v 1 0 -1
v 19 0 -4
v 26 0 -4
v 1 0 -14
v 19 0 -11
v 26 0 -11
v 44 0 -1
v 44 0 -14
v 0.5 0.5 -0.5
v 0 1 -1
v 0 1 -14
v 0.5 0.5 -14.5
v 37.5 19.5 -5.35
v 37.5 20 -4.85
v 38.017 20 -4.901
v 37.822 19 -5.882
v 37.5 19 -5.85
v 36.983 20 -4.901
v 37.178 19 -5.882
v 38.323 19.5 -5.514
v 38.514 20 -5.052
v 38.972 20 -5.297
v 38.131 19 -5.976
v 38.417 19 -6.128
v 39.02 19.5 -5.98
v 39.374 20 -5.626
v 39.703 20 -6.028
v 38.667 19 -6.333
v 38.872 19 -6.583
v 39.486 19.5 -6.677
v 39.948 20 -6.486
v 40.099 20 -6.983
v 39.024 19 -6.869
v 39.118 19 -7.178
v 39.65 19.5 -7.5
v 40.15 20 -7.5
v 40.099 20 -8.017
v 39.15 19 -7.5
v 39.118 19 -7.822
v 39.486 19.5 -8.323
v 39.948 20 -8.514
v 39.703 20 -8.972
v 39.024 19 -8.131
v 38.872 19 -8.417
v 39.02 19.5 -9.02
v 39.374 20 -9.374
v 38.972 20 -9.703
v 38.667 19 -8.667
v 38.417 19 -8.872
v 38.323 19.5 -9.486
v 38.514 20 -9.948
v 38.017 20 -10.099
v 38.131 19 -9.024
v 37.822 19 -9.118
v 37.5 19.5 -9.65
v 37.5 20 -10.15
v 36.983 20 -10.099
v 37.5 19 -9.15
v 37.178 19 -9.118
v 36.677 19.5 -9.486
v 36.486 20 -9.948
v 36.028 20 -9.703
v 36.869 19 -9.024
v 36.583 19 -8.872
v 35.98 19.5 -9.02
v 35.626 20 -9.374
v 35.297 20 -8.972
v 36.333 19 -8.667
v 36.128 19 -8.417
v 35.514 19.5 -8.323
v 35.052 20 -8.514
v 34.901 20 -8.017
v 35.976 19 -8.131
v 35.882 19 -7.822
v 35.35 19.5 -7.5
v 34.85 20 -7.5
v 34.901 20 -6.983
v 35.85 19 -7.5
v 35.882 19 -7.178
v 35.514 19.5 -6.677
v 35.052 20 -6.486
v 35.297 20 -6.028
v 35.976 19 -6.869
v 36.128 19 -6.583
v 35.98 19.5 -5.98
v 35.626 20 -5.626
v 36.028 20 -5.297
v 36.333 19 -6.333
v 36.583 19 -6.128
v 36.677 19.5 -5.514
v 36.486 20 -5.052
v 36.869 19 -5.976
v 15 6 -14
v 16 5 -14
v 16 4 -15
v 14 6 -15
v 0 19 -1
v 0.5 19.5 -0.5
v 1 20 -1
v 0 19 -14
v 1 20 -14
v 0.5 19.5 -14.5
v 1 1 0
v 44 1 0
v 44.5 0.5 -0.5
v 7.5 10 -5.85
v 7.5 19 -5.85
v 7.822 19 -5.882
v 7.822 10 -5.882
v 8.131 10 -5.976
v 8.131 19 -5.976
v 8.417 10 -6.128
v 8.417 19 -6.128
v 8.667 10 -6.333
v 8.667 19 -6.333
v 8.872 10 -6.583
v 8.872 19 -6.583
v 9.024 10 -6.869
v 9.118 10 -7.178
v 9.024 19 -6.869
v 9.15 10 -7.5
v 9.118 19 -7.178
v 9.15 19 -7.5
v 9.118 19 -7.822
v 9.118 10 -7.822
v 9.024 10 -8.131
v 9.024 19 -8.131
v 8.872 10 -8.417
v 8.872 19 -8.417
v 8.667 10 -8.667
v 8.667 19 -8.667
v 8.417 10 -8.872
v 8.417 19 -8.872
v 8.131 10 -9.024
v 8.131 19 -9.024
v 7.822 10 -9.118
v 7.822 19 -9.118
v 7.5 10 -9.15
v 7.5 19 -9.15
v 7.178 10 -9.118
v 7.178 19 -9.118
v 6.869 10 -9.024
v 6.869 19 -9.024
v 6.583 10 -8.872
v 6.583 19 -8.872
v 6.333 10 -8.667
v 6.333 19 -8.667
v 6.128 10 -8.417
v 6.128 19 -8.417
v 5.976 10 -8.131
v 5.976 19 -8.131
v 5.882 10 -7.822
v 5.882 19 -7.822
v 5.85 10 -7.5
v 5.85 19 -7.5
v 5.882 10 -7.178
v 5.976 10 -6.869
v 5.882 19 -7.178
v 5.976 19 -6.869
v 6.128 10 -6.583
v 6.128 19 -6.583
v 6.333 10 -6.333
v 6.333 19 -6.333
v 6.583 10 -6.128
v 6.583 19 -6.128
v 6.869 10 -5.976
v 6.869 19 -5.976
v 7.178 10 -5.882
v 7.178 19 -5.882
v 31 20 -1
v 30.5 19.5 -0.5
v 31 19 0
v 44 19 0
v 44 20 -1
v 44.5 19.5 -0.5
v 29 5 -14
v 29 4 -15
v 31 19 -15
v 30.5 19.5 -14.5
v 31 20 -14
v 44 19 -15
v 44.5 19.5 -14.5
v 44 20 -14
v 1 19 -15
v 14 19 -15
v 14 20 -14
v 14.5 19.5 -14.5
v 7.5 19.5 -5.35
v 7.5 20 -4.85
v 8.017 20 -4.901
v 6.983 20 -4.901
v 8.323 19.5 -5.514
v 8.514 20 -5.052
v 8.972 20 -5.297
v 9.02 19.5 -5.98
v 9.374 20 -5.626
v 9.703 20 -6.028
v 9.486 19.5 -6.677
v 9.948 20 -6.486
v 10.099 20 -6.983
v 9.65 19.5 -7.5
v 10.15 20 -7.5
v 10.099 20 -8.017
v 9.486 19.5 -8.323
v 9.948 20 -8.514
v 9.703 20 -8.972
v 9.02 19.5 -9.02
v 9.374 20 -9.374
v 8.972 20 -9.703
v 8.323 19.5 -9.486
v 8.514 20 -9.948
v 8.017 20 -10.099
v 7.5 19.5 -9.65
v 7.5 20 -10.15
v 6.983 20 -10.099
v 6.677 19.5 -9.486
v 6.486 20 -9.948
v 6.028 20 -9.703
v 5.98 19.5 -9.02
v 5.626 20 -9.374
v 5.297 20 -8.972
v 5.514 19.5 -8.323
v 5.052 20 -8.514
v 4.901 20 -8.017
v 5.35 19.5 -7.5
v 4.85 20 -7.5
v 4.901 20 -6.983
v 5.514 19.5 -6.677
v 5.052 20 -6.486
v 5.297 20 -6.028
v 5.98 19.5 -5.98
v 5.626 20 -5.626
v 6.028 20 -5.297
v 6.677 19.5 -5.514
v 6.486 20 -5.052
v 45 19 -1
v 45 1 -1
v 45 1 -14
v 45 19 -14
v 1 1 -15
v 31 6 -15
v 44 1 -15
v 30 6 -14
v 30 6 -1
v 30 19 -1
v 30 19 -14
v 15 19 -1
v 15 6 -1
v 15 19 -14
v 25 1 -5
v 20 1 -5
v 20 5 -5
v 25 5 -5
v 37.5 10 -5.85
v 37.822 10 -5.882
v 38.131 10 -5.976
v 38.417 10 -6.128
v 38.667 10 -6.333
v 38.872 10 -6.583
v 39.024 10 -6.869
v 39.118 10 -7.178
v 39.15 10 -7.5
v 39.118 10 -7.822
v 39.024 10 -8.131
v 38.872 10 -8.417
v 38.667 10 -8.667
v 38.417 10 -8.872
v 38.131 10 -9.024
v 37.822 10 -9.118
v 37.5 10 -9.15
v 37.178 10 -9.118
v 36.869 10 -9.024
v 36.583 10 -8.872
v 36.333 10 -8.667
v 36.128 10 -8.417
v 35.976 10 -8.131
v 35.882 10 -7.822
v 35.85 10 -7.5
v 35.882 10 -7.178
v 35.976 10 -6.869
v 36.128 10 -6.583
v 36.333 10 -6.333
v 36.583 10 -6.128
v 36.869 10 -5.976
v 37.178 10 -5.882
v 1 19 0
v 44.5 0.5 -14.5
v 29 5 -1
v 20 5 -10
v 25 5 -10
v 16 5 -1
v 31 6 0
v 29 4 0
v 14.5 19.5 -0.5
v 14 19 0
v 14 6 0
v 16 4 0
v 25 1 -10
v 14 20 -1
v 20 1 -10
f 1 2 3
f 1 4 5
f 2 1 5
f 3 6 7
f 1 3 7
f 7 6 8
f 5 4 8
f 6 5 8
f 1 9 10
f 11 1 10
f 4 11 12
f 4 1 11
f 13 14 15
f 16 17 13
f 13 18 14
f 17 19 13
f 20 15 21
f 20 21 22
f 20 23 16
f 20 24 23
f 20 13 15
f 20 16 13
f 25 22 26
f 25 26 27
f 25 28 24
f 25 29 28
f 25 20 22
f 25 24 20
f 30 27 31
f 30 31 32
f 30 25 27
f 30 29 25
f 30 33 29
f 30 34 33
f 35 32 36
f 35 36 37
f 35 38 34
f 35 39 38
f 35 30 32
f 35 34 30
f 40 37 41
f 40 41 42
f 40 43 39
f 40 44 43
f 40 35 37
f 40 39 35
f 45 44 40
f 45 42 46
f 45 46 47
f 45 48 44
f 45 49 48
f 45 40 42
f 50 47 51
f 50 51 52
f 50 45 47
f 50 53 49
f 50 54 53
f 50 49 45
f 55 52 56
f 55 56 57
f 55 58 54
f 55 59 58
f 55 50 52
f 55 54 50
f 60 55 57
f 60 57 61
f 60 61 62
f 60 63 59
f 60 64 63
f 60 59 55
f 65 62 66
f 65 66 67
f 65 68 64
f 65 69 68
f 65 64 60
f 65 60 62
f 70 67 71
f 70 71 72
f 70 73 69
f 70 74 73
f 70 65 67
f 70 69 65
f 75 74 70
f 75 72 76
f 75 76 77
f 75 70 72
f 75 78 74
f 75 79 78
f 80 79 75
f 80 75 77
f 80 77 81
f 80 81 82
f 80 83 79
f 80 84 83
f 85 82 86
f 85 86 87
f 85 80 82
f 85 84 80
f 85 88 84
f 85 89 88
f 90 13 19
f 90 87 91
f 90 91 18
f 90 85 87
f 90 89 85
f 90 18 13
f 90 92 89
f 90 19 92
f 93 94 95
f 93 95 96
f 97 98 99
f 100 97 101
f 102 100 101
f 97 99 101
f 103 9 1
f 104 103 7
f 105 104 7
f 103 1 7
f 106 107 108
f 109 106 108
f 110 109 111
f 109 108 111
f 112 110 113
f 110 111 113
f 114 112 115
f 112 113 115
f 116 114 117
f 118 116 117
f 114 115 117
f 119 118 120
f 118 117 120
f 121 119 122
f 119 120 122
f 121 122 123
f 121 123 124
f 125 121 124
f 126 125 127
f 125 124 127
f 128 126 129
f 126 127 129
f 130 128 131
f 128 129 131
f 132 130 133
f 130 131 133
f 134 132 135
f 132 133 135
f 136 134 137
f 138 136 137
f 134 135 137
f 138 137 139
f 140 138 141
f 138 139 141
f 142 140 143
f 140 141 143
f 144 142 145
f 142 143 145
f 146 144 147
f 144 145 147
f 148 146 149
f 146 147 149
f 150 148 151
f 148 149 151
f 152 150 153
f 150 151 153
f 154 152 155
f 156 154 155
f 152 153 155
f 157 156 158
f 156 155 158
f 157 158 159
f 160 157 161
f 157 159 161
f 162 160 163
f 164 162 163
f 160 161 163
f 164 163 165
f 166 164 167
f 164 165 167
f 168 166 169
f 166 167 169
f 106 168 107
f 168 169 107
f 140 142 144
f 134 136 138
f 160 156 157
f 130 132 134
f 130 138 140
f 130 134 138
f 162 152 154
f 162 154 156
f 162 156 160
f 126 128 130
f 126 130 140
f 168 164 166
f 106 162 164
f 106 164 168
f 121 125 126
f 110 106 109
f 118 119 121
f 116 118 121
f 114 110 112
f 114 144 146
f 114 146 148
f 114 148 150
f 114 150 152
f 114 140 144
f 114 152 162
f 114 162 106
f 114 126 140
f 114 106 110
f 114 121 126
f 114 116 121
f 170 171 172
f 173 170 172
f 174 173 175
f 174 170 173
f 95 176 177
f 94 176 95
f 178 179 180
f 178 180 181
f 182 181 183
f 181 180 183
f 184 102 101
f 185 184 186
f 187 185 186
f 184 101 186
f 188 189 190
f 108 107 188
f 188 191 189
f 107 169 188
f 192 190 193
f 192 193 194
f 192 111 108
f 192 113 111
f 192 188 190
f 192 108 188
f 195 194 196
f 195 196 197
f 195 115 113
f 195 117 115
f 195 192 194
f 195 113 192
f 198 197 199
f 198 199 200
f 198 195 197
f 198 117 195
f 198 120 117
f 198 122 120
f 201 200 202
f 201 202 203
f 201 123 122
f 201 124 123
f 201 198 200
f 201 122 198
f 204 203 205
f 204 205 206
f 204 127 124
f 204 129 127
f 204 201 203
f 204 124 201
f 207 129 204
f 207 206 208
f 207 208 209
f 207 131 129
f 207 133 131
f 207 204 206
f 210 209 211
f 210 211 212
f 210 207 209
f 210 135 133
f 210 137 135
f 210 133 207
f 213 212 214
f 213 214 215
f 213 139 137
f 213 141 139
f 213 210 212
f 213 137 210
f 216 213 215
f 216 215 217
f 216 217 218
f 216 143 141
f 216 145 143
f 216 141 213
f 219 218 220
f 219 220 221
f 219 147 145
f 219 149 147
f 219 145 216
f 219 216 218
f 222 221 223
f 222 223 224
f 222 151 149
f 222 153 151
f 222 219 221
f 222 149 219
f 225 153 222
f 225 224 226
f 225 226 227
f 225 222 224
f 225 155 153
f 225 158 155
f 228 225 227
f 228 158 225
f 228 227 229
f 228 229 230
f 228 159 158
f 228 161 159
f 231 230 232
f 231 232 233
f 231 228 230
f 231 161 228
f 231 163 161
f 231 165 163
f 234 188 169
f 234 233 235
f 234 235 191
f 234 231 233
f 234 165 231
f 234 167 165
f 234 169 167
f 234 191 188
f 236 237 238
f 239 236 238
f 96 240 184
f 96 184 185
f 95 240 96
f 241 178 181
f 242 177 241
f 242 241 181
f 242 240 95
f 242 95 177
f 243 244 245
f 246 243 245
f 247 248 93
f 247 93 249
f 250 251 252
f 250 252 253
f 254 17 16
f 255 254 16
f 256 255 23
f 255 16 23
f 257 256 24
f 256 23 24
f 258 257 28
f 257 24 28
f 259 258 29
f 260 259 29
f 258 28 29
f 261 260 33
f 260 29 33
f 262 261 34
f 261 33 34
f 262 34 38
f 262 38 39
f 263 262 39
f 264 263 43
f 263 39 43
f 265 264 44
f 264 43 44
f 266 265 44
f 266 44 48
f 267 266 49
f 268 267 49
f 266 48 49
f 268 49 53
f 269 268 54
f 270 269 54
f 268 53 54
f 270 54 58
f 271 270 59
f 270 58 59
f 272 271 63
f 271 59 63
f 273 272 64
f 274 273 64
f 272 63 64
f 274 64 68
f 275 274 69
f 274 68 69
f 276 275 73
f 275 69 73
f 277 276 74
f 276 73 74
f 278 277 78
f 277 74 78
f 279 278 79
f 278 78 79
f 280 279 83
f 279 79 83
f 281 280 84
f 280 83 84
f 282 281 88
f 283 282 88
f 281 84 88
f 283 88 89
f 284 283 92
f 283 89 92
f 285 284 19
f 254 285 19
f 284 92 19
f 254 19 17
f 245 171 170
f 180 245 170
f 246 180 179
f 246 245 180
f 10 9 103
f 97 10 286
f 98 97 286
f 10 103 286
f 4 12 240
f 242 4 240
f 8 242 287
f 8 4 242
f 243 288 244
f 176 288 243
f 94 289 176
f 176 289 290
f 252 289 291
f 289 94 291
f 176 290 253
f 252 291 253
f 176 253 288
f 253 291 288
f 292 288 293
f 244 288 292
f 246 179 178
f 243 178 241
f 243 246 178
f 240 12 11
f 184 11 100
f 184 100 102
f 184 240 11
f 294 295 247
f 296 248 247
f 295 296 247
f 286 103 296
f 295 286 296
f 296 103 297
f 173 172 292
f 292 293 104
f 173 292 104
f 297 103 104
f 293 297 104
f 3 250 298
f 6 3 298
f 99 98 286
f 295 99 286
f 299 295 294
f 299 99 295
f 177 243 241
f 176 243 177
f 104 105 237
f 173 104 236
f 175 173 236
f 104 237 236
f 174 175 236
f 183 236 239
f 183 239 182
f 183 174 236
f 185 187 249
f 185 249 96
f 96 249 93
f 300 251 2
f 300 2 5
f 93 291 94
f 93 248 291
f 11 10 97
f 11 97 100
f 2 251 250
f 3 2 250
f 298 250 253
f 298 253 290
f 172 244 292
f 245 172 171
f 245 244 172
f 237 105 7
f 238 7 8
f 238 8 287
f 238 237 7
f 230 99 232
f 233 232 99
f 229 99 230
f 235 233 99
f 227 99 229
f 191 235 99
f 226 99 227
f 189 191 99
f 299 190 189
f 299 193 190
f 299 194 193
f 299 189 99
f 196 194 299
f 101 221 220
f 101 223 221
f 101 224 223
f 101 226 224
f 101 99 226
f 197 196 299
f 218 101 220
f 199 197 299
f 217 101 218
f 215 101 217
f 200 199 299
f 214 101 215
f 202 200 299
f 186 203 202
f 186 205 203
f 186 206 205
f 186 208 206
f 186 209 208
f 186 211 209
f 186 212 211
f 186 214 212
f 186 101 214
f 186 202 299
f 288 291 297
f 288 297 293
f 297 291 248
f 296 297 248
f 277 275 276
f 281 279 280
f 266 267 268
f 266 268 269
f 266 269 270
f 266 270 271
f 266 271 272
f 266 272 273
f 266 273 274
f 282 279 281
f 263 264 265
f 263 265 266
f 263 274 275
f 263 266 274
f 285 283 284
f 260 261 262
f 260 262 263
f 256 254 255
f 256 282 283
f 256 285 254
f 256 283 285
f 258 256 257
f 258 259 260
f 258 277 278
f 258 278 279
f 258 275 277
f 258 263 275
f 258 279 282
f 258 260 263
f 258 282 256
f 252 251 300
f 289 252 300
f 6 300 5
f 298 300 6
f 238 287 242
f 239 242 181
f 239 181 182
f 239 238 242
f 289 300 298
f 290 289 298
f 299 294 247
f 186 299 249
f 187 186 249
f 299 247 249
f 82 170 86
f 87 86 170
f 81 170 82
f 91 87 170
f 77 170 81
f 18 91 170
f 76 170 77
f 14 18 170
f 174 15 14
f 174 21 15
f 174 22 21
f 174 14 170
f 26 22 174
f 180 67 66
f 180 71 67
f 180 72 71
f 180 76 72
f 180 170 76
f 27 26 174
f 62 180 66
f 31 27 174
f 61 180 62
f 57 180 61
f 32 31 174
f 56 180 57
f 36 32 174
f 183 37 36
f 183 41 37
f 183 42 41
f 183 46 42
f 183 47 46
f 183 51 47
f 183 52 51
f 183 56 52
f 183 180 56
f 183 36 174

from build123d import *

# Parameters (mm, degrees)
SKETCH1_W           = 45
SKETCH1_H           = 15
SKETCH1_W_2         = 5
SKETCH1_H_2         = 5
BOSS_EXTRUDE1_DEPTH = 20
SKETCH2_W           = 15
SKETCH2_H           = 15
CUT_EXTRUDE1_DEPTH  = 20
SKETCH3_R           = 1.65
CUT_EXTRUDE2_DEPTH  = 10
CHAMFER2_SIZE       = 1
CHAMFER3_SIZE       = 1


with BuildPart() as part:
    # Sketch1 → Boss-Extrude1 (new body)
    with BuildSketch(Plane(origin=(0, 0, 0), x_dir=(1, 0, 0), z_dir=(0, 1, 0))):
        with Locations((22.5, 7.5)):
            Rectangle(SKETCH1_W, SKETCH1_H)
        with Locations((22.5, 7.5)):
            Rectangle(SKETCH1_W_2, SKETCH1_H_2, mode=Mode.SUBTRACT)
    extrude(amount=BOSS_EXTRUDE1_DEPTH)

    # Sketch2 → Cut-Extrude1 (cut)
    with BuildSketch(Plane.XY):
        with Locations((22.5, 12.5)):
            Rectangle(SKETCH2_W, SKETCH2_H)
    extrude(amount=-CUT_EXTRUDE1_DEPTH, mode=Mode.SUBTRACT)

    # Sketch3 → Cut-Extrude2 (cut)
    with BuildSketch(Plane(origin=(0, 20, 0), x_dir=(1, 0, 0), z_dir=(0, 1, 0))):
        with Locations(Location((37.5, 7.5, 0), (0, 0, 270))):
            Circle(SKETCH3_R)
        with Locations(Location((7.5, 7.5, 0), (0, 0, 270))):
            Circle(SKETCH3_R)
    extrude(amount=-CUT_EXTRUDE2_DEPTH, mode=Mode.SUBTRACT)

    # Chamfer2
    chamfer2_edges = [part.edges().sort_by_distance(p)[0] for p in [
        (45, 20, -7.5),
        (20, 0, -7.5),
        (22.5, 0, -5),
        (25, 0, -7.5),
        (22.5, 0, -10),
        (37.5, 20, -15),
        (7.5, 20, -15),
        (37.5, 20, 0),
        (30, 20, -7.5),
        (15, 20, -7.5),
        (0, 20, -7.5),
        (22.5, 0, -15),
        (45, 0, -7.5),
        (37.5, 20, -9.15),
        (22.5, 0, 0),
        (7.5, 20, -9.15),
        (0, 0, -7.5),
        (7.5, 20, 0),
    ]]
    chamfer(chamfer2_edges, length=CHAMFER2_SIZE)

    # Chamfer3
    chamfer3_edges = [part.edges().sort_by_distance(p)[0] for p in [
        (30, 12, -15),
        (15, 5, -7.5),
        (22.5, 5, -15),
        (30, 5, -7.5),
        (22.5, 5, 0),
        (30, 12, 0),
        (45, 10, -15),
        (45, 10, 0),
        (15, 12, 0),
        (0, 10, 0),
        (15, 12, -15),
        (0, 10, -15),
    ]]
    chamfer(chamfer3_edges, length=CHAMFER3_SIZE)


solid = part.part
